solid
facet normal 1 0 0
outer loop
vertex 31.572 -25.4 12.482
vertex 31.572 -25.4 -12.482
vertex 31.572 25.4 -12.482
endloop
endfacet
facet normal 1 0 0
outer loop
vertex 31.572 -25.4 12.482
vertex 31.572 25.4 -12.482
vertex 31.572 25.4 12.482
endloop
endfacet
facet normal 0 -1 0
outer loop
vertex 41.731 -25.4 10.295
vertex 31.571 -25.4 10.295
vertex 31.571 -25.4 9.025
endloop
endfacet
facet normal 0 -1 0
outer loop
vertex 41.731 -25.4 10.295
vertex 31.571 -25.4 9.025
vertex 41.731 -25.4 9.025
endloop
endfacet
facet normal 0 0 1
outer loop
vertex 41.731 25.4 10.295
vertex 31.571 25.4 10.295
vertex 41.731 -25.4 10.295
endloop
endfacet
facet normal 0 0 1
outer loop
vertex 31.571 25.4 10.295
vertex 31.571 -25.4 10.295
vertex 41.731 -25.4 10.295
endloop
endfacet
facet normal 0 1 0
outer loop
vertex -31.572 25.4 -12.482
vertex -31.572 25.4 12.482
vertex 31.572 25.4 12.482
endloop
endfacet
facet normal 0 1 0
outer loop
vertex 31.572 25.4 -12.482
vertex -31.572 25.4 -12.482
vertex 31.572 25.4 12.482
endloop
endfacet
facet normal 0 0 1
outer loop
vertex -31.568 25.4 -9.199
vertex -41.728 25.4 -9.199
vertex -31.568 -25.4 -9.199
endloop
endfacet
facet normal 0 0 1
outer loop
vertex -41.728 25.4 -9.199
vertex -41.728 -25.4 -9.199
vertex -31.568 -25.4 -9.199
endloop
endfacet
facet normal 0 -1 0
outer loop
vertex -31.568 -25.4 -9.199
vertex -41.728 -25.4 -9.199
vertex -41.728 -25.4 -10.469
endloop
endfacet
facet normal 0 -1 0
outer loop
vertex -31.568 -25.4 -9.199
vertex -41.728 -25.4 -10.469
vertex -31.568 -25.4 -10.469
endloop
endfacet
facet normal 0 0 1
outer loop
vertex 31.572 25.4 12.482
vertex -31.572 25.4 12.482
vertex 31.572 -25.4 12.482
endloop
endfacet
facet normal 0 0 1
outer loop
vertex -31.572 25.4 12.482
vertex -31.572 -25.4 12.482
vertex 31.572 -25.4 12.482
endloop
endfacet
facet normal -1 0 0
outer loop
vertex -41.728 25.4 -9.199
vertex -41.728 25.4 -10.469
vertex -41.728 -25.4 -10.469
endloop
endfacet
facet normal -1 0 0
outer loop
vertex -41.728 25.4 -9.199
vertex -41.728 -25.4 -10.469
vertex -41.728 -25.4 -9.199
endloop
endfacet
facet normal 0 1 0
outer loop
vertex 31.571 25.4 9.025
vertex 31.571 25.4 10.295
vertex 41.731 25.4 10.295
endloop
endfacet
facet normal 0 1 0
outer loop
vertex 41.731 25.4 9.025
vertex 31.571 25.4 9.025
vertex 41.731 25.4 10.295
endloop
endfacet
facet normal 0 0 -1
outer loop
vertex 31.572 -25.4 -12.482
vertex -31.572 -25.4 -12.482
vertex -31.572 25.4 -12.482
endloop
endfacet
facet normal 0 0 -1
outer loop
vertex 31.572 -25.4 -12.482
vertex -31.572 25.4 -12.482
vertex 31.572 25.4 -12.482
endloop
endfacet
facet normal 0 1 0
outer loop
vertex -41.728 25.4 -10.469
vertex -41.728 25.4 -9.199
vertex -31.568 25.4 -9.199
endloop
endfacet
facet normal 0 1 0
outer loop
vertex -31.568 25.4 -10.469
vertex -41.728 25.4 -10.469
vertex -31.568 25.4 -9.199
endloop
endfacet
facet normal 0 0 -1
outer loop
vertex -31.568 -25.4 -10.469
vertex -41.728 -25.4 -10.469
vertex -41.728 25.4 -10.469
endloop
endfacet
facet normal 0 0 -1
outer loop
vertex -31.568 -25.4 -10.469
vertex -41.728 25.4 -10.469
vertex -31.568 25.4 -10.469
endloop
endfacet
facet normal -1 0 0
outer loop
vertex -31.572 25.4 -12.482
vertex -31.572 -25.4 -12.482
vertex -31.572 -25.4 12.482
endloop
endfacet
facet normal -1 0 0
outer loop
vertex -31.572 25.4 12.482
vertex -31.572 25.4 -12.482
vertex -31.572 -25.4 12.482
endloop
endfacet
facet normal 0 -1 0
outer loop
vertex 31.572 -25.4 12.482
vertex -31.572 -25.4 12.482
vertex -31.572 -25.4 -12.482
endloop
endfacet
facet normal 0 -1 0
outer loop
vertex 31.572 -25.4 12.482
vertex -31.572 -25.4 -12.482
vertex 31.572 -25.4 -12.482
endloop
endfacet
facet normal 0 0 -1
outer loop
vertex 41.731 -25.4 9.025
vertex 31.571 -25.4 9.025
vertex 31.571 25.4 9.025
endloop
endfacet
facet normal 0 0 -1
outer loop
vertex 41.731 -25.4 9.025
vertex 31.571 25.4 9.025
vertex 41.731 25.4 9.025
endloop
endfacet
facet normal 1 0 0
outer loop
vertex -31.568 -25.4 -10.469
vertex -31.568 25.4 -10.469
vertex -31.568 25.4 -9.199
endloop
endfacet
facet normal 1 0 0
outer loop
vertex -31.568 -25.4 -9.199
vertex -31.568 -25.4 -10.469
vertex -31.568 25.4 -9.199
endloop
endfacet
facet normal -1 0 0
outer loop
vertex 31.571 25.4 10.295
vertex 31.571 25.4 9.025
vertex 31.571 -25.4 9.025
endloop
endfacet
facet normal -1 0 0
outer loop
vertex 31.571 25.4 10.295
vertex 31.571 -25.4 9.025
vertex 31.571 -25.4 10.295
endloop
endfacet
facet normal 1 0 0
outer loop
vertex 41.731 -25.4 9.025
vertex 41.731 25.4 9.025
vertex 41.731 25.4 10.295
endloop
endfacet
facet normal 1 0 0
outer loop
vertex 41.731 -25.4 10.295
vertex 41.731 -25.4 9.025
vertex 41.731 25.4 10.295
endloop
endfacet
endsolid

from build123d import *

# Parameters (mm, degrees)
F0_W     = 63.144043088
F0_H     = 24.9639227986
F3_DEPTH = 25.4
F1_W     = 10.16
F1_H     = 1.27
F2_W     = 10.16
F2_H     = 1.27


with BuildPart() as f3:
    # F0 (on Front) → F3 (new body, symmetric)
    with BuildSketch(Plane.XZ):
        Rectangle(F0_W, F0_H)
    extrude(amount=F3_DEPTH, both=True)


with BuildPart() as f3b:
    # F1 (on Front) → F3, piece 2 (new body, symmetric)
    with BuildSketch(Plane.XZ):
        with Locations((36.6514939815, 9.6600476645)):
            Rectangle(F1_W, F1_H)
    extrude(amount=F3_DEPTH, both=True)


with BuildPart() as f3c:
    # F2 (on Front) → F3, piece 3 (new body, symmetric)
    with BuildSketch(Plane.XZ):
        with Locations((-36.6476550698, -9.8343824477)):
            Rectangle(F2_W, F2_H)
    extrude(amount=F3_DEPTH, both=True)


solid = Compound([f3.part, f3b.part, f3c.part])
